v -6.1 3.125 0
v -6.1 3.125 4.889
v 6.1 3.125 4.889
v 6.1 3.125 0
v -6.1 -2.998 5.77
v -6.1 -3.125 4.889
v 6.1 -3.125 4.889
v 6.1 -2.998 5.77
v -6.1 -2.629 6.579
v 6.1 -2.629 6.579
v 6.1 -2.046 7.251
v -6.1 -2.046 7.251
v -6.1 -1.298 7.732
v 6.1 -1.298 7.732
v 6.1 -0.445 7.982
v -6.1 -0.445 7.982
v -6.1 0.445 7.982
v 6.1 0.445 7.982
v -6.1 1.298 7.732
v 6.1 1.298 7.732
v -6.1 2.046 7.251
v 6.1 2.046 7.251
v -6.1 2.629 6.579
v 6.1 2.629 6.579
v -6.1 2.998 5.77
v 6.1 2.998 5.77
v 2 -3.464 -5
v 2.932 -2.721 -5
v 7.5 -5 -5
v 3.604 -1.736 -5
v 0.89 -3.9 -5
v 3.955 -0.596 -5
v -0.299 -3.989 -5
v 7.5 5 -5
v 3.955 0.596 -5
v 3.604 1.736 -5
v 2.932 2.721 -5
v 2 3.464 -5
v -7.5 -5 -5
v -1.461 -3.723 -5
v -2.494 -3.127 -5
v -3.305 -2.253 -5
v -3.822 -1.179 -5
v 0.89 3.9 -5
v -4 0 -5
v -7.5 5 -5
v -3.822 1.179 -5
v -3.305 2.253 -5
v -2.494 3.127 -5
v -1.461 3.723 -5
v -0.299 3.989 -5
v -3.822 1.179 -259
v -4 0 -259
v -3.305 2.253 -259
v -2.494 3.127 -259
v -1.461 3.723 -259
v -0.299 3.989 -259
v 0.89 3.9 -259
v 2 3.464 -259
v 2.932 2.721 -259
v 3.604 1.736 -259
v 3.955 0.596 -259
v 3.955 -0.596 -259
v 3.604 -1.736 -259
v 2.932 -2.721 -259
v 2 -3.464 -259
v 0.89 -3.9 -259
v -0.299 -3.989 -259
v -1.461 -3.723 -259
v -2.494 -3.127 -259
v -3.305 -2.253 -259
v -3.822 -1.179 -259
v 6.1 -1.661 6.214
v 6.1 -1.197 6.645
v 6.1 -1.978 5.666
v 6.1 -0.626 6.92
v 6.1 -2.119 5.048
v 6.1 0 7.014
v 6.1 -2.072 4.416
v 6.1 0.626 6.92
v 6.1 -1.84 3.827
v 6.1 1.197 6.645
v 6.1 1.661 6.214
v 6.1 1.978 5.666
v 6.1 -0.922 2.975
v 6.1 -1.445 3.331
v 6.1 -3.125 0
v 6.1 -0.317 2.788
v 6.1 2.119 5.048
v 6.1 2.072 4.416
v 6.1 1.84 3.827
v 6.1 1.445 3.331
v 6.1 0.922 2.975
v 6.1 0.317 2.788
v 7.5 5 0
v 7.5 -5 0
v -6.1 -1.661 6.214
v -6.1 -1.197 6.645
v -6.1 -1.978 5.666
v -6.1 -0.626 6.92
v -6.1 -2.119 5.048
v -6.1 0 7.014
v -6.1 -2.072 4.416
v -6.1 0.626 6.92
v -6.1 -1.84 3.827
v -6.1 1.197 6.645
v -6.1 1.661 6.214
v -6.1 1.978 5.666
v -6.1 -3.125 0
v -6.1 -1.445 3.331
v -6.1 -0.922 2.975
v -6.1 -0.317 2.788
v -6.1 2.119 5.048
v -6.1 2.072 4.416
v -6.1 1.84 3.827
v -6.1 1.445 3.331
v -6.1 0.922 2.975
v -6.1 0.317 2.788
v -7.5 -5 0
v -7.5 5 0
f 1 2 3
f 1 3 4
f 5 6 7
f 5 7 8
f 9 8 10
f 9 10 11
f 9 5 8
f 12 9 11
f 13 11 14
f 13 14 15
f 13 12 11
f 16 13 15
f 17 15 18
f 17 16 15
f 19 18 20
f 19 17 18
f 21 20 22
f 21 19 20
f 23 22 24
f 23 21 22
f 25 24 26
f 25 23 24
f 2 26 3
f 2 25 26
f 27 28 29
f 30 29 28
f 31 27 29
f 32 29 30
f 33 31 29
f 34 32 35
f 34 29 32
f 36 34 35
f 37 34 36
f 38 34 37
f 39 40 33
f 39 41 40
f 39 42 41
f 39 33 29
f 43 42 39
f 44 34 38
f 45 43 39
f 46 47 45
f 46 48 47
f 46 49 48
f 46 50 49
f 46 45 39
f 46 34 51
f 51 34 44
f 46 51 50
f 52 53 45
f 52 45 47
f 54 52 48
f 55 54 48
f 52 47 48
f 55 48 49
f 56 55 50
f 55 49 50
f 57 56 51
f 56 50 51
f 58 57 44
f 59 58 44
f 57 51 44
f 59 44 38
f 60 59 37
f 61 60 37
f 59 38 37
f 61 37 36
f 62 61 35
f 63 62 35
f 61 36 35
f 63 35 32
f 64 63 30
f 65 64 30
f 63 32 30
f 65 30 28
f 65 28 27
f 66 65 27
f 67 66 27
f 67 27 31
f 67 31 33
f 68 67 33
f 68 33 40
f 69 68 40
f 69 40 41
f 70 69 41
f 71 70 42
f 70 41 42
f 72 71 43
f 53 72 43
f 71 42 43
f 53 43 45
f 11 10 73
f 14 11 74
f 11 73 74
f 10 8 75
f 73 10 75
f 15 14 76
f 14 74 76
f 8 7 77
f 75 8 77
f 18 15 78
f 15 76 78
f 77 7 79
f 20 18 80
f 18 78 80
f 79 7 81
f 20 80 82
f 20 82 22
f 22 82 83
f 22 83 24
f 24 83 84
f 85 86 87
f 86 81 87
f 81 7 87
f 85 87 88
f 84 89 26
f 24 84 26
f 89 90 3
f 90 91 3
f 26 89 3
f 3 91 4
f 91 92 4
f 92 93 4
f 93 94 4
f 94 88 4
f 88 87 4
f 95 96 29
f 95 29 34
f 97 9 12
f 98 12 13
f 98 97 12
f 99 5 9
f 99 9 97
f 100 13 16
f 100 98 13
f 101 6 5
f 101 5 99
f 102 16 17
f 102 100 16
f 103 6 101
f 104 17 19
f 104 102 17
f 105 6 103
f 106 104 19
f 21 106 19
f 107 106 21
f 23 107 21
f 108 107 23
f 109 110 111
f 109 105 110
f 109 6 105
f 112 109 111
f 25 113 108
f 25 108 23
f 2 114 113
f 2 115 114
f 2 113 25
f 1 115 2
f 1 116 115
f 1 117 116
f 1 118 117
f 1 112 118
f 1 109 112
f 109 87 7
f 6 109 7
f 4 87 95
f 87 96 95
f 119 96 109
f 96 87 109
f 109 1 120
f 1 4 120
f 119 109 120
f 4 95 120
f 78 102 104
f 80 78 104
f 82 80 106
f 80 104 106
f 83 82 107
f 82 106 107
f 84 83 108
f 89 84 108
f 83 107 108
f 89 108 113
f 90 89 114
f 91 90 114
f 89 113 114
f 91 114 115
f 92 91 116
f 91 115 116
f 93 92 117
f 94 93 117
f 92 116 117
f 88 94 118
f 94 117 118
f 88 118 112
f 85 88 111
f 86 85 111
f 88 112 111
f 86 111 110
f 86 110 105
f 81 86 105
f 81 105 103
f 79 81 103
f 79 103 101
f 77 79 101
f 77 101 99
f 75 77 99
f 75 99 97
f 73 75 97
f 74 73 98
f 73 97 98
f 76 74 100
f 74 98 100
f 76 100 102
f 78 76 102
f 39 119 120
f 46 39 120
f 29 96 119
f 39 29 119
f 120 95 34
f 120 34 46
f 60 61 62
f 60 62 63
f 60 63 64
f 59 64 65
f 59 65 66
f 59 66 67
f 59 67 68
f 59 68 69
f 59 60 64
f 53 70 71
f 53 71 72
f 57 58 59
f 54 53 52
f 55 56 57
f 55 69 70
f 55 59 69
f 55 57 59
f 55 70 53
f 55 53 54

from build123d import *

# Parameters (mm, degrees)
SKETCH1_W           = 12.2
SKETCH1_H           = 10
BOSS_EXTRUDE1_DEPTH = 10
SKETCH2_R           = 2.125
CUT_EXTRUDE1_DEPTH  = 12.2
SKETCH3_W           = 15
SKETCH3_H           = 10
BOSS_EXTRUDE2_DEPTH = 5
SKETCH4_R           = 4
BOSS_EXTRUDE3_DEPTH = 254


with BuildPart() as part:
    # Sketch1 → Boss-Extrude1 (new body)
    with BuildSketch(Plane.XY):
        Rectangle(SKETCH1_W, SKETCH1_H)
    extrude(amount=BOSS_EXTRUDE1_DEPTH)

    # Sketch2 → Cut-Extrude1 (cut)
    with BuildSketch(Plane.ZY.offset(6.1)):
        with Locations((4.889205296, 0)):
            Circle(SKETCH2_R)
        with BuildLine():
            Line((4.889205296, 3.125), (0, 3.125))
            Line((0, 3.125), (0, 5))
            Line((0, 5), (10, 5))
            Line((10, 5), (10, -5))
            Line((10, -5), (0, -5))
            Line((0, -5), (0, -3.125))
            Line((0, -3.125), (4.889205296, -3.125))
            ThreePointArc((4.889205296, -3.125), (8.014205296, 0), (4.889205296, 3.125))
        make_face()
    extrude(amount=-CUT_EXTRUDE1_DEPTH, mode=Mode.SUBTRACT)

    # Sketch3 → Boss-Extrude2 (add)
    with BuildSketch(Plane(origin=(0, 0, 0), x_dir=(-1, 0, 0), z_dir=(0, 0, -1))):
        Rectangle(SKETCH3_W, SKETCH3_H)
    extrude(amount=BOSS_EXTRUDE2_DEPTH)

    # Sketch4 → Boss-Extrude3 (add)
    with BuildSketch(Plane(origin=(0, 0, -5), x_dir=(-1, 0, 0), z_dir=(0, 0, -1))):
        Circle(SKETCH4_R)
    extrude(amount=BOSS_EXTRUDE3_DEPTH)


solid = part.part
